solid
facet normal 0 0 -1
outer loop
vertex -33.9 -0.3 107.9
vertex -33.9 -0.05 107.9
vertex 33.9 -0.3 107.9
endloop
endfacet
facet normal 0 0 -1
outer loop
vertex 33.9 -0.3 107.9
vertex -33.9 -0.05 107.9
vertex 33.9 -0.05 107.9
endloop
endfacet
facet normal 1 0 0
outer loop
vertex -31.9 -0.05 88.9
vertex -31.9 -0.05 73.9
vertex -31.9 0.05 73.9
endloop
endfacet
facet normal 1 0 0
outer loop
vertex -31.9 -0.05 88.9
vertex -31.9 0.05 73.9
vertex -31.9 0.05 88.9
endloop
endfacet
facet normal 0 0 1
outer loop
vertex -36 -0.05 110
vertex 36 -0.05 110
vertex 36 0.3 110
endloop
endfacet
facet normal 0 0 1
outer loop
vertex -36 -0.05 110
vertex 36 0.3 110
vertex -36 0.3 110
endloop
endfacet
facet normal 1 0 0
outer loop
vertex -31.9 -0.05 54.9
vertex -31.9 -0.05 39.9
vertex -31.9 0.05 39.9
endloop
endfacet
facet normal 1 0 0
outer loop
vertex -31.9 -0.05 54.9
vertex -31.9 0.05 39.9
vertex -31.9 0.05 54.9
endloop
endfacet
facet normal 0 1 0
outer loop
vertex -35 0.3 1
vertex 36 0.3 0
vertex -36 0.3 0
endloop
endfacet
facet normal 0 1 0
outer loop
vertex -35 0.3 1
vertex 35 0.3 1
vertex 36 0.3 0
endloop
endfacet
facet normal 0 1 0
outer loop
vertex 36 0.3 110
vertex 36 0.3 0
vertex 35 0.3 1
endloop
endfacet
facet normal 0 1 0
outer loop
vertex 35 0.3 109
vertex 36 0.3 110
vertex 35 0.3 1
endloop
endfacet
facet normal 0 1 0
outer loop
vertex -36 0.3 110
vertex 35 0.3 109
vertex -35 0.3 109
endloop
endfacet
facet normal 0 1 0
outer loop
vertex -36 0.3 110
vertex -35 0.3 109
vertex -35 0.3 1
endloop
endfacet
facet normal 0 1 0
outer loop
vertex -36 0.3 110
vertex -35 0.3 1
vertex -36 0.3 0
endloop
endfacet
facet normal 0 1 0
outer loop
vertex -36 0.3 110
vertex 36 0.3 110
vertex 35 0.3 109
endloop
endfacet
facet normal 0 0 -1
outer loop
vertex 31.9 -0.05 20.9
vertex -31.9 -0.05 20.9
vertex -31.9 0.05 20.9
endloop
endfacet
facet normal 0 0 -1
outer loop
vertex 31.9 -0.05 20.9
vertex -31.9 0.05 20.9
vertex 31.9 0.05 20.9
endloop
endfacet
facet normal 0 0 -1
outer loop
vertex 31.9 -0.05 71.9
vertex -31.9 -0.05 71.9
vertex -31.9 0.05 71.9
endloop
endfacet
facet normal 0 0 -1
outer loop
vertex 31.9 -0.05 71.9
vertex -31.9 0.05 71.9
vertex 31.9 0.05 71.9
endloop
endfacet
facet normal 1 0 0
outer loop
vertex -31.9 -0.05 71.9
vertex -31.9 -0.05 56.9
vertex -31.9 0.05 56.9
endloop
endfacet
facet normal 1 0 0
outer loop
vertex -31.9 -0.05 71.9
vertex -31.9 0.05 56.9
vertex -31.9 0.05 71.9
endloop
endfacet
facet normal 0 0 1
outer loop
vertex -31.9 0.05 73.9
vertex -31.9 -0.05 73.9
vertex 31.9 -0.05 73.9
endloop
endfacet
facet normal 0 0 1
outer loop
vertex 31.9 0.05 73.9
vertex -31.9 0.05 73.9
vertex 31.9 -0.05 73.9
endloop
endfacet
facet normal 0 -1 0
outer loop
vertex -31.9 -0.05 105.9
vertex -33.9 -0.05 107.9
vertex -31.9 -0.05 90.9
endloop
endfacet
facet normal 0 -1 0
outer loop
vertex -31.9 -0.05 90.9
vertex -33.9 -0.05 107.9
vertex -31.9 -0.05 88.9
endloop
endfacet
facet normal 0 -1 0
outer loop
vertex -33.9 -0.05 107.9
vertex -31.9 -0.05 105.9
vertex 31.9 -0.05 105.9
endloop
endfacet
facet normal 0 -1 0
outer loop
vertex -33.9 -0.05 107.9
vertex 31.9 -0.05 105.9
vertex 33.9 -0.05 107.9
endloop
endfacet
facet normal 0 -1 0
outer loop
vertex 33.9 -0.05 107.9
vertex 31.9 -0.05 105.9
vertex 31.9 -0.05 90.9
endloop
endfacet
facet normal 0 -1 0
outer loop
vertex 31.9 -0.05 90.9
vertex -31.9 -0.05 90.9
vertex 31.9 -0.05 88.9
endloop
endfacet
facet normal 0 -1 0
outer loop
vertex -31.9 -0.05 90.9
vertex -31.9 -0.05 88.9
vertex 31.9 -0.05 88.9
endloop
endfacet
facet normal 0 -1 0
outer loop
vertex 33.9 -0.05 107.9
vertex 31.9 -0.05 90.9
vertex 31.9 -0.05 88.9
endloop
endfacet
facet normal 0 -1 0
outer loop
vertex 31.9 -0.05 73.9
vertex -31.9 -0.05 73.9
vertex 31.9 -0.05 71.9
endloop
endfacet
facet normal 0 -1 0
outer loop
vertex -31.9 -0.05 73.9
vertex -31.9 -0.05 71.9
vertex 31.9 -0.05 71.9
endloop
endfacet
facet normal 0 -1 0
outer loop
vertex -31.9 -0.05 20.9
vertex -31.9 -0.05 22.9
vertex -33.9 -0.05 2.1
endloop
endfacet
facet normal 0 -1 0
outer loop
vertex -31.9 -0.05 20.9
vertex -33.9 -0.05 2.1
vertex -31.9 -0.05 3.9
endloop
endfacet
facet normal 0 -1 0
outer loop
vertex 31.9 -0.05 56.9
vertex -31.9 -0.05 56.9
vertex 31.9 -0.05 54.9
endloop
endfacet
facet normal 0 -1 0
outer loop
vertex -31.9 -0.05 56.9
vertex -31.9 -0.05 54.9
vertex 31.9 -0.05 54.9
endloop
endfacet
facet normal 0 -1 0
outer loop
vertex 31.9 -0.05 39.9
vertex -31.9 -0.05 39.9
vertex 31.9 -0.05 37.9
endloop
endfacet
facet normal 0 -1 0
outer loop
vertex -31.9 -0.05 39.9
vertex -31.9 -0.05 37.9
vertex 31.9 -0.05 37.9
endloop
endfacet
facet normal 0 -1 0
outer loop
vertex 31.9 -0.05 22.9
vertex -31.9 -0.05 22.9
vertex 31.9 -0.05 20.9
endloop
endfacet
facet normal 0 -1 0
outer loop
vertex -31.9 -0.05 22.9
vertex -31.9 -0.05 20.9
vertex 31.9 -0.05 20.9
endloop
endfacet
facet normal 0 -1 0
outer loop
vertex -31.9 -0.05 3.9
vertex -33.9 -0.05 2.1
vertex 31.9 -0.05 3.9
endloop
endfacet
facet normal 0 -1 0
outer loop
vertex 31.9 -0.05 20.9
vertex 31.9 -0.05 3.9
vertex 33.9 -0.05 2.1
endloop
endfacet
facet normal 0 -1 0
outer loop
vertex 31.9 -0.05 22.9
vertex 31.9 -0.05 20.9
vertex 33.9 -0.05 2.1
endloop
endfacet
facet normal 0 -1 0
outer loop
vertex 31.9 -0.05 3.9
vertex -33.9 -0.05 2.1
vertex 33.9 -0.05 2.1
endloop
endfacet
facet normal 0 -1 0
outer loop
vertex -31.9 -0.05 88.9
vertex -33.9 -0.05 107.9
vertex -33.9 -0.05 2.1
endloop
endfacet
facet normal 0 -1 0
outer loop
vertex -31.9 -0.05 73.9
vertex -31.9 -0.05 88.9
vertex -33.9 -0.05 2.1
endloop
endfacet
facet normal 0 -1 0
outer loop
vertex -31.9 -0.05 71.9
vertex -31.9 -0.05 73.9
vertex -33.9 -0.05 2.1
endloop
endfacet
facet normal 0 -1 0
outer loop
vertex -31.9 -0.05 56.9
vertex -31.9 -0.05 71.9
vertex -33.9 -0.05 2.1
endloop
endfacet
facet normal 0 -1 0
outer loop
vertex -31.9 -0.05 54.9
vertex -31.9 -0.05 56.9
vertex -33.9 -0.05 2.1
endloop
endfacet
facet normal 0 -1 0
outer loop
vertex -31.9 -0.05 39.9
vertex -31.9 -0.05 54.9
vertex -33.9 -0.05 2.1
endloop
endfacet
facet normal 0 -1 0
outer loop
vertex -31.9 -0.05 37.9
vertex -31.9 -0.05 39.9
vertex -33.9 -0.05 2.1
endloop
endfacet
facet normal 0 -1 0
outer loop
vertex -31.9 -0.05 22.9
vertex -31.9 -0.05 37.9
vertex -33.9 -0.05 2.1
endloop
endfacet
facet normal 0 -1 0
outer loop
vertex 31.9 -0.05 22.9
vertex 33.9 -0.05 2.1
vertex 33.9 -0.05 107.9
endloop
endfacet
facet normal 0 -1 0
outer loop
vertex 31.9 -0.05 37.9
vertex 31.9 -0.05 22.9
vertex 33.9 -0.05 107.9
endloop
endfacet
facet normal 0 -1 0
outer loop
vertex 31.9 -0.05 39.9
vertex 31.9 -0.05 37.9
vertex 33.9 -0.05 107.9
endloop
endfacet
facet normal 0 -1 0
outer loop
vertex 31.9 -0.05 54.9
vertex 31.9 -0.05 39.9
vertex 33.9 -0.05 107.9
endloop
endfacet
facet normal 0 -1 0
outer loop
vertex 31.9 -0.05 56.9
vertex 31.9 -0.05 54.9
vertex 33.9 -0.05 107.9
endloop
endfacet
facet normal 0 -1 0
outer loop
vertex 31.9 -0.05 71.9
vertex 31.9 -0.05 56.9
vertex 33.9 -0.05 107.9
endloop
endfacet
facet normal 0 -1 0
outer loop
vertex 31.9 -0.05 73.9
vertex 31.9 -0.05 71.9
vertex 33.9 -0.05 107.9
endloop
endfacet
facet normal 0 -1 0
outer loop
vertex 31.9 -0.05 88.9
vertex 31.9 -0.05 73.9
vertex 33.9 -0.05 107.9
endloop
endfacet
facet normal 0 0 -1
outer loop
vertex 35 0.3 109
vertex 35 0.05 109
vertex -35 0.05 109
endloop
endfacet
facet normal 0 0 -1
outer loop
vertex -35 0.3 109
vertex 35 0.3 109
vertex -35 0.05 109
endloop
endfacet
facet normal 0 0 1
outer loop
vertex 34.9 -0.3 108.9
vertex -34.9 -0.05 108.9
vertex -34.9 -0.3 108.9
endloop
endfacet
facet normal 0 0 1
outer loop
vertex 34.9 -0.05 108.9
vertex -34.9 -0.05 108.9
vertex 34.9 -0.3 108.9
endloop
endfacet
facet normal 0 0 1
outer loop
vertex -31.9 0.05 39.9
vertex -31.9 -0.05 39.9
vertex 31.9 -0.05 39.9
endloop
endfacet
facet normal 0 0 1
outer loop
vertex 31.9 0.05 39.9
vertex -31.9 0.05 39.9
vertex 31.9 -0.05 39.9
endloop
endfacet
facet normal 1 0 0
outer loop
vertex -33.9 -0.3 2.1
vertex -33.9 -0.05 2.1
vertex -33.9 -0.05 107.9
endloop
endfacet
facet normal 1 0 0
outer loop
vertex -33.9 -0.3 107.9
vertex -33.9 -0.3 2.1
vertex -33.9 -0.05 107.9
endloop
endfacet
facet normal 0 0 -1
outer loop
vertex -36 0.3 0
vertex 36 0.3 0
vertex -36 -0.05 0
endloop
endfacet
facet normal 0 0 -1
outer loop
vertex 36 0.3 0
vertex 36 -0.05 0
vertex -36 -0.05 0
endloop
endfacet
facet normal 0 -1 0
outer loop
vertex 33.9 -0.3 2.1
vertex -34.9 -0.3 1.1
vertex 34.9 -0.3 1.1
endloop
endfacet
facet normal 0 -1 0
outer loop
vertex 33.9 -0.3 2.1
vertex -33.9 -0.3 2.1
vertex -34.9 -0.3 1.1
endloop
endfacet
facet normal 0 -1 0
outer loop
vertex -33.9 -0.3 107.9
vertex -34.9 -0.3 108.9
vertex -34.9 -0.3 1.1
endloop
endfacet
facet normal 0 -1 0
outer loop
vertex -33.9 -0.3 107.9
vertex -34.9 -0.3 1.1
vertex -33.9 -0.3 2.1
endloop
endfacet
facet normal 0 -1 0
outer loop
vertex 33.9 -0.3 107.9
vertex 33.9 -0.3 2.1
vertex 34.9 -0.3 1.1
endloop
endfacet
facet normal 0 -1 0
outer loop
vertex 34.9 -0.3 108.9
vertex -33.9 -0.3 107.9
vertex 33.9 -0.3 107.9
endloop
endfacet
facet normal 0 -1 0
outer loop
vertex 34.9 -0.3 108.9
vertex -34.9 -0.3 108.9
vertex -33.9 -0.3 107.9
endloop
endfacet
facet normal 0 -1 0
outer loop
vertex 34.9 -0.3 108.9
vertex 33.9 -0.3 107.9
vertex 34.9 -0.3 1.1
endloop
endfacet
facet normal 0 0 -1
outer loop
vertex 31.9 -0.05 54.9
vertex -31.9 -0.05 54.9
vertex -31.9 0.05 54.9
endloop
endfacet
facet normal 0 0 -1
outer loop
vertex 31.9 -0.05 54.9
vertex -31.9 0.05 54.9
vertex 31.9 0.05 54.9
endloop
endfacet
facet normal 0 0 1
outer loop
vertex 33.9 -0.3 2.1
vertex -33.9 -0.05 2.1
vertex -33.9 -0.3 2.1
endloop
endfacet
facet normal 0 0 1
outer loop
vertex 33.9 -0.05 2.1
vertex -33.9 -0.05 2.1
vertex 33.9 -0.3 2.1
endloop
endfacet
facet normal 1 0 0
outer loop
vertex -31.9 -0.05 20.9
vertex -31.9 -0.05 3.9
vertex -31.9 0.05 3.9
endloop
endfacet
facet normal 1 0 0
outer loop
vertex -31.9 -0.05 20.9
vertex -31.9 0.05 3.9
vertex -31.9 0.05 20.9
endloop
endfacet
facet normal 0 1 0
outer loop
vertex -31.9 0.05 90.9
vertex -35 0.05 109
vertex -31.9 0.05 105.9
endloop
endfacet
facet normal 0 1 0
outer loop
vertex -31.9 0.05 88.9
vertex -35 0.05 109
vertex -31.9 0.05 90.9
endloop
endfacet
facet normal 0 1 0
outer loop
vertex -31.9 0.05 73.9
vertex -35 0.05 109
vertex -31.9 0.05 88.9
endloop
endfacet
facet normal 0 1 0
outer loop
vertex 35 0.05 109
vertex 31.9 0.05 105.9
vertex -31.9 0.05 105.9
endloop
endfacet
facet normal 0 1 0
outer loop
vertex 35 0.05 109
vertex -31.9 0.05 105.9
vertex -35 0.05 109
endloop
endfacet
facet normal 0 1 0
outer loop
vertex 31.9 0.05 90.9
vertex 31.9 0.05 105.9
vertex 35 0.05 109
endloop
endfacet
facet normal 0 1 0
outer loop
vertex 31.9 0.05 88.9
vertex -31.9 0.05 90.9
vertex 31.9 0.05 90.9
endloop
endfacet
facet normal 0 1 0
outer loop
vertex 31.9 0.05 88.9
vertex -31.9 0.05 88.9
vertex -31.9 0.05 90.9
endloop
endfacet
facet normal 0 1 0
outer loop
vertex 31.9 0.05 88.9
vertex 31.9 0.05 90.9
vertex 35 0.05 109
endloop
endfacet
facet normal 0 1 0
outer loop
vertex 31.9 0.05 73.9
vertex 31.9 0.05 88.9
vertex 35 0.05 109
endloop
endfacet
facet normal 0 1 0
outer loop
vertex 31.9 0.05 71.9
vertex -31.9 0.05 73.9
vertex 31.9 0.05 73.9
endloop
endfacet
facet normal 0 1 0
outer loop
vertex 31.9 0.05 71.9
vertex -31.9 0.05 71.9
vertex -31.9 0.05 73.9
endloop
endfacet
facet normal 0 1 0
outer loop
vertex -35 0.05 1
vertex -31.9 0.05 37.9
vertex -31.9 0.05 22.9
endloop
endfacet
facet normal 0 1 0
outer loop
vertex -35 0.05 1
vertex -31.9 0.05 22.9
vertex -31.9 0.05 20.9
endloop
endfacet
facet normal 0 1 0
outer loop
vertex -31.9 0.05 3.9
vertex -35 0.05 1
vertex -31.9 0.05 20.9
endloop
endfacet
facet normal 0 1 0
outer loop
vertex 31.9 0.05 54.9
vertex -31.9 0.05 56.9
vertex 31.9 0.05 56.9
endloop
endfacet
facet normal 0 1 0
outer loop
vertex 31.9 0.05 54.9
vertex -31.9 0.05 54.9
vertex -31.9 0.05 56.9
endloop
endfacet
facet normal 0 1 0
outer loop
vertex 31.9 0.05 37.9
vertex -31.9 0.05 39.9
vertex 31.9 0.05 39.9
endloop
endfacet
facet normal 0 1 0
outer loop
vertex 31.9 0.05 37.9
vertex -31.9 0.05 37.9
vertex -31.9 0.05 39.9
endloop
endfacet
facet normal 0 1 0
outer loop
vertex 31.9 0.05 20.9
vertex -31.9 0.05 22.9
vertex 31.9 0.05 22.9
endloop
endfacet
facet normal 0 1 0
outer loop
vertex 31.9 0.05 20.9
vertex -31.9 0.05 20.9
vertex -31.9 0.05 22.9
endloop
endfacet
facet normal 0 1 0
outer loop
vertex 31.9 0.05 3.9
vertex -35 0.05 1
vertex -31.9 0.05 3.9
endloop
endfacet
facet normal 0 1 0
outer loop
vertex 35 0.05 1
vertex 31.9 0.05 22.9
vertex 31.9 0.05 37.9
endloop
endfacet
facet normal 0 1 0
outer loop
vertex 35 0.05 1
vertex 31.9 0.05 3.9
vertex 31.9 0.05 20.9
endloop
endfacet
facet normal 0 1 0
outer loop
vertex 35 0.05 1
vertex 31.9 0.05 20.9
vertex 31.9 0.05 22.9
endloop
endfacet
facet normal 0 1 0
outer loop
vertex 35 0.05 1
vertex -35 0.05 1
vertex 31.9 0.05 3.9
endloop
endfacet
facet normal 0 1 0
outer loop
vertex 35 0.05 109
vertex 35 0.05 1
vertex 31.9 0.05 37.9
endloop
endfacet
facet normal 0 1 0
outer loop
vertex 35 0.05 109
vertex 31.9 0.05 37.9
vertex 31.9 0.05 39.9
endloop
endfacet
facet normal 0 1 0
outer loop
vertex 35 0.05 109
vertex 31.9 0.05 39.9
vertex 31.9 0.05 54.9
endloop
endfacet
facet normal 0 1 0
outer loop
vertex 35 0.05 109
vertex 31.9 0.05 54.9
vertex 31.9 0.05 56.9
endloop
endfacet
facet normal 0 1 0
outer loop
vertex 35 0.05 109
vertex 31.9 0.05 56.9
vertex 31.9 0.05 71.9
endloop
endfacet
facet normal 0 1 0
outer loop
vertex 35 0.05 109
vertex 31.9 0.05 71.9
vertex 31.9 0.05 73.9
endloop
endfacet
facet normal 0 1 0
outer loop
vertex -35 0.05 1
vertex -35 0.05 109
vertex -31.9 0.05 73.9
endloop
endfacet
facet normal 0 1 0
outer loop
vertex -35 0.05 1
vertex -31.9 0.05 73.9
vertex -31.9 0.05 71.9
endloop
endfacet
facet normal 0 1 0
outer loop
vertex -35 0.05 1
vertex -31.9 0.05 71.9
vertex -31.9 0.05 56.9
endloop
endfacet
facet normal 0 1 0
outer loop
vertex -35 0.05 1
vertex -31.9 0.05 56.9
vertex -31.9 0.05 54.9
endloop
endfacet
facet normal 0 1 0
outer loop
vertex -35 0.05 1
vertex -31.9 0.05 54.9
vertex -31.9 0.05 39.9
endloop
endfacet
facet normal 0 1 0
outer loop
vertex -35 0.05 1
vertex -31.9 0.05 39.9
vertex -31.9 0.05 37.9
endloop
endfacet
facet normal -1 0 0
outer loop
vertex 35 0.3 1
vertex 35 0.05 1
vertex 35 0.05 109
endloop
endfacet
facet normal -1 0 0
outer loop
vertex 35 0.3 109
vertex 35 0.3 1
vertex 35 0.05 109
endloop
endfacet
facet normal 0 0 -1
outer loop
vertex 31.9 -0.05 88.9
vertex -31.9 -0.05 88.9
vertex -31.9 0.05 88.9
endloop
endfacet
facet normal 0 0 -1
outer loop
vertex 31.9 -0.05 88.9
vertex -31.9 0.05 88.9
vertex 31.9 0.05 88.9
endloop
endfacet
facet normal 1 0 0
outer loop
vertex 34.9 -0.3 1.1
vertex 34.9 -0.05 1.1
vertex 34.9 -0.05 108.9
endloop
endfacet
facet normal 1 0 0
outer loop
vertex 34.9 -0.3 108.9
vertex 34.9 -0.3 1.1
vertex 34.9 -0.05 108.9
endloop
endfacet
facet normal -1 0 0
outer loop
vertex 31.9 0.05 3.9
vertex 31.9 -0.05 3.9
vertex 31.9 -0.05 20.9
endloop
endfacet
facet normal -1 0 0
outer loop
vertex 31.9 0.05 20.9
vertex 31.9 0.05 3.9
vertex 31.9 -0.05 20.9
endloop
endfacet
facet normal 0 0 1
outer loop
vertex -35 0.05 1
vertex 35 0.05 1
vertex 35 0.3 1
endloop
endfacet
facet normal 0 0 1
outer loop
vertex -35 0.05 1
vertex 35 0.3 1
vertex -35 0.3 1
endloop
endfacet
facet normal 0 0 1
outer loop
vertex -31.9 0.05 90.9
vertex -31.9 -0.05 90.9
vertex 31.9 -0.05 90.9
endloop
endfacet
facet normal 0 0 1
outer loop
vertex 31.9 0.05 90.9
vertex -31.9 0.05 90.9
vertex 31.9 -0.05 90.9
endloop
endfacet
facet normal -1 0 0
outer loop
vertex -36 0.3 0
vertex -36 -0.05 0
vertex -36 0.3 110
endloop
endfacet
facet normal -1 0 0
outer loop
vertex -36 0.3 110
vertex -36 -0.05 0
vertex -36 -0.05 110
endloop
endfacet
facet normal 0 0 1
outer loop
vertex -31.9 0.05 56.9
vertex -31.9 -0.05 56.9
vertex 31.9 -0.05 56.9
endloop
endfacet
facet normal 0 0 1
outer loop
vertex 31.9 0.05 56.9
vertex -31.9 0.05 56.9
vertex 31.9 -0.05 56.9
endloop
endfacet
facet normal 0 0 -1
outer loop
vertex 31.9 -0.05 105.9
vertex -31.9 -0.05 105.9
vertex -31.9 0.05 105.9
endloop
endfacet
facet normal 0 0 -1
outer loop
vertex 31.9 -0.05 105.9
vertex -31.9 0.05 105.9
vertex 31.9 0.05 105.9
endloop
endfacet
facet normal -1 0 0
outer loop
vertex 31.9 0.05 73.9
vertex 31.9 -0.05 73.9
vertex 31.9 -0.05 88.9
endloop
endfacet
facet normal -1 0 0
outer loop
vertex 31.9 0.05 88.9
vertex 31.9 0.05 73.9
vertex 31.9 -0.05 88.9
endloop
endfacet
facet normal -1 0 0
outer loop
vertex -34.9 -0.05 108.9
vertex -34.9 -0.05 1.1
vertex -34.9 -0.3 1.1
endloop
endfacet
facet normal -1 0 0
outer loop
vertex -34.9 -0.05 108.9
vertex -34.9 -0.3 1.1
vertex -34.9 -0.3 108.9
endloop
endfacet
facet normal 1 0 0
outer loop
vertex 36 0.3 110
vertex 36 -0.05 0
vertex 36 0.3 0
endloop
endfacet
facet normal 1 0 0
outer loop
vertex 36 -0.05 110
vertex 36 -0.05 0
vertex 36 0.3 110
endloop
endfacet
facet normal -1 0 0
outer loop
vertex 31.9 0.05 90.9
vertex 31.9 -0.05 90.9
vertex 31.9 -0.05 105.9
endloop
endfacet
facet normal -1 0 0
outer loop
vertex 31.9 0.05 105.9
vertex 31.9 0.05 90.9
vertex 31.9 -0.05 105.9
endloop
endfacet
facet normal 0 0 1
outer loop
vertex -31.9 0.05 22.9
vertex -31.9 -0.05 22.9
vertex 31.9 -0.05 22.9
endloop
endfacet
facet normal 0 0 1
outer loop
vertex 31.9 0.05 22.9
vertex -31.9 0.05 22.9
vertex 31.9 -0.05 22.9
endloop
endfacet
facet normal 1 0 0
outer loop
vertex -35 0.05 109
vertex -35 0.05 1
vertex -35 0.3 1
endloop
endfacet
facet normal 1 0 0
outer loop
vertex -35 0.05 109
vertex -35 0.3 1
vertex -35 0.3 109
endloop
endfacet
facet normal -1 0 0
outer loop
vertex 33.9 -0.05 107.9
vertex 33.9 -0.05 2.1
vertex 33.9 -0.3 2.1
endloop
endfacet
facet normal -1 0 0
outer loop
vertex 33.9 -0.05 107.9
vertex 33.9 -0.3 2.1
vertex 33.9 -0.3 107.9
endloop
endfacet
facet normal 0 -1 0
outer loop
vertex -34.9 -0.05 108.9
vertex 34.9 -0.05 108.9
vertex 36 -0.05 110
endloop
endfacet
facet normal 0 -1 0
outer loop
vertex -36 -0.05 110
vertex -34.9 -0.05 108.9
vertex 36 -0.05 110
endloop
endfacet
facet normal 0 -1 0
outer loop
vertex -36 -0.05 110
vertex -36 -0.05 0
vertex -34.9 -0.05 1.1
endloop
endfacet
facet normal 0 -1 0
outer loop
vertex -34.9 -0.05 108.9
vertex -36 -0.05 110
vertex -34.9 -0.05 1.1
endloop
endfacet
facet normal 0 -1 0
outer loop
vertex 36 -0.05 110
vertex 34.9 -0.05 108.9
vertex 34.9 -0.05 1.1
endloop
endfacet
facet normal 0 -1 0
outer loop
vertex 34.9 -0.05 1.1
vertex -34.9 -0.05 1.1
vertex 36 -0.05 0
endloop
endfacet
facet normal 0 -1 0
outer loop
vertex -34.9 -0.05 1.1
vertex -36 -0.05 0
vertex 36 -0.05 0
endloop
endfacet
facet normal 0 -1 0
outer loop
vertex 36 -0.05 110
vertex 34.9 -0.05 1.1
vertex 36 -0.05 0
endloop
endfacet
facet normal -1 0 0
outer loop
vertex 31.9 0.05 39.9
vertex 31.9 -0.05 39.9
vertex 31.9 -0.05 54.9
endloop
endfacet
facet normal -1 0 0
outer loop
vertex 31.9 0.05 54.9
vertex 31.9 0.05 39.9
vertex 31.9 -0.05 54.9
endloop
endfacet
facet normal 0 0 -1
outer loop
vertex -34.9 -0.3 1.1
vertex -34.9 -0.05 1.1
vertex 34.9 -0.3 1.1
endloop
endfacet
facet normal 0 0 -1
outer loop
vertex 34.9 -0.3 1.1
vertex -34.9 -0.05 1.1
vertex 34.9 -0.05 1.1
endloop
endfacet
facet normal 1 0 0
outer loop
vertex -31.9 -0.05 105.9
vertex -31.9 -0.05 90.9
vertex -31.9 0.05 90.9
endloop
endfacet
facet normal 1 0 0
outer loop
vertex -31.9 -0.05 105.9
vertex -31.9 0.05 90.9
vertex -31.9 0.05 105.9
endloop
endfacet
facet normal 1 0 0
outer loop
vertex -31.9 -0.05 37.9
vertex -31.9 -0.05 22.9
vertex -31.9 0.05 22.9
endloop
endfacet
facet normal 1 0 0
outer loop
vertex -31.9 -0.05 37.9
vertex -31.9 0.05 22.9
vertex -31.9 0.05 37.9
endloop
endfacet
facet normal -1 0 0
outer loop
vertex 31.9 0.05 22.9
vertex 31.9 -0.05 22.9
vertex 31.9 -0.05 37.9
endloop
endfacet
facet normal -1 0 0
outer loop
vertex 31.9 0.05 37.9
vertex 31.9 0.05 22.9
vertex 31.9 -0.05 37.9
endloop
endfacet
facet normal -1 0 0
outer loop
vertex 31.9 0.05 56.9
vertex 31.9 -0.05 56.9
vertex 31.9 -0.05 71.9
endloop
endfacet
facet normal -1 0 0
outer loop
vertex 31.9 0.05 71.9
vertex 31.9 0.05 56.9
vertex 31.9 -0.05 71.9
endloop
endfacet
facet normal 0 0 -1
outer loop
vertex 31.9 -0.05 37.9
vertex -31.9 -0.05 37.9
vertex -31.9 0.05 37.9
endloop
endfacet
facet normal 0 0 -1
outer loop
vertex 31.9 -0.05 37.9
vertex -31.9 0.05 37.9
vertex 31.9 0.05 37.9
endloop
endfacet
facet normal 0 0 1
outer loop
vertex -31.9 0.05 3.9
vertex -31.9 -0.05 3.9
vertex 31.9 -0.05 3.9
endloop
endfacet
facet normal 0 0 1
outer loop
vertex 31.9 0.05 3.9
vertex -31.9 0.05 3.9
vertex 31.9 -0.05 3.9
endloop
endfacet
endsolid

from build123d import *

# Parameters (mm, degrees)
F0_W     = 72
F0_H     = 0.1
F1_DEPTH = 110
F2_W     = 69.8
F2_H     = 107.8
F2_W_2   = 67.8
F2_H_2   = 105.8
F3_DEPTH = 0.25
F4_W     = 72
F4_H     = 110
F4_W_2   = 70
F4_H_2   = 108
F5_DEPTH = 0.25
F6_W     = 63.8
F6_H     = 15
F6_H_2   = 17
F7_DEPTH = 2


with BuildPart() as f1:
    # F0 (on Top) → F1 (new body)
    with BuildSketch(Plane.XY):
        Rectangle(F0_W, F0_H)
    extrude(amount=F1_DEPTH)

    # F2 (on face) → F3 (join)
    with BuildSketch(Plane.XZ.offset(0.05)):
        with Locations((0, 55)):
            Rectangle(F2_W, F2_H)
        with Locations((0, 55)):
            Rectangle(F2_W_2, F2_H_2, mode=Mode.SUBTRACT)
    extrude(amount=F3_DEPTH)

    # F4 (on face) → F5 (join)
    with BuildSketch(Plane(origin=(0, 0.05, 0), x_dir=(-1, 0, 0), z_dir=(0, 1, 0))):
        with Locations((0, 55)):
            Rectangle(F4_W, F4_H)
        with Locations((0, 55)):
            Rectangle(F4_W_2, F4_H_2, mode=Mode.SUBTRACT)
    extrude(amount=F5_DEPTH)

    # F6 (on face) → F7 (cut)
    with BuildSketch(Plane.XZ.offset(0.05)):
        with Locations((0, 98.4)):
            Rectangle(F6_W, F6_H)
        with Locations((0, 81.4)):
            Rectangle(F6_W, F6_H)
        with Locations((0, 64.4)):
            Rectangle(F6_W, F6_H)
        with Locations((0, 47.4)):
            Rectangle(F6_W, F6_H)
        with Locations((0, 30.4)):
            Rectangle(F6_W, F6_H)
        with Locations((0, 12.4)):
            Rectangle(F6_W, F6_H_2)
    extrude(amount=-F7_DEPTH, mode=Mode.SUBTRACT)


solid = f1.part
